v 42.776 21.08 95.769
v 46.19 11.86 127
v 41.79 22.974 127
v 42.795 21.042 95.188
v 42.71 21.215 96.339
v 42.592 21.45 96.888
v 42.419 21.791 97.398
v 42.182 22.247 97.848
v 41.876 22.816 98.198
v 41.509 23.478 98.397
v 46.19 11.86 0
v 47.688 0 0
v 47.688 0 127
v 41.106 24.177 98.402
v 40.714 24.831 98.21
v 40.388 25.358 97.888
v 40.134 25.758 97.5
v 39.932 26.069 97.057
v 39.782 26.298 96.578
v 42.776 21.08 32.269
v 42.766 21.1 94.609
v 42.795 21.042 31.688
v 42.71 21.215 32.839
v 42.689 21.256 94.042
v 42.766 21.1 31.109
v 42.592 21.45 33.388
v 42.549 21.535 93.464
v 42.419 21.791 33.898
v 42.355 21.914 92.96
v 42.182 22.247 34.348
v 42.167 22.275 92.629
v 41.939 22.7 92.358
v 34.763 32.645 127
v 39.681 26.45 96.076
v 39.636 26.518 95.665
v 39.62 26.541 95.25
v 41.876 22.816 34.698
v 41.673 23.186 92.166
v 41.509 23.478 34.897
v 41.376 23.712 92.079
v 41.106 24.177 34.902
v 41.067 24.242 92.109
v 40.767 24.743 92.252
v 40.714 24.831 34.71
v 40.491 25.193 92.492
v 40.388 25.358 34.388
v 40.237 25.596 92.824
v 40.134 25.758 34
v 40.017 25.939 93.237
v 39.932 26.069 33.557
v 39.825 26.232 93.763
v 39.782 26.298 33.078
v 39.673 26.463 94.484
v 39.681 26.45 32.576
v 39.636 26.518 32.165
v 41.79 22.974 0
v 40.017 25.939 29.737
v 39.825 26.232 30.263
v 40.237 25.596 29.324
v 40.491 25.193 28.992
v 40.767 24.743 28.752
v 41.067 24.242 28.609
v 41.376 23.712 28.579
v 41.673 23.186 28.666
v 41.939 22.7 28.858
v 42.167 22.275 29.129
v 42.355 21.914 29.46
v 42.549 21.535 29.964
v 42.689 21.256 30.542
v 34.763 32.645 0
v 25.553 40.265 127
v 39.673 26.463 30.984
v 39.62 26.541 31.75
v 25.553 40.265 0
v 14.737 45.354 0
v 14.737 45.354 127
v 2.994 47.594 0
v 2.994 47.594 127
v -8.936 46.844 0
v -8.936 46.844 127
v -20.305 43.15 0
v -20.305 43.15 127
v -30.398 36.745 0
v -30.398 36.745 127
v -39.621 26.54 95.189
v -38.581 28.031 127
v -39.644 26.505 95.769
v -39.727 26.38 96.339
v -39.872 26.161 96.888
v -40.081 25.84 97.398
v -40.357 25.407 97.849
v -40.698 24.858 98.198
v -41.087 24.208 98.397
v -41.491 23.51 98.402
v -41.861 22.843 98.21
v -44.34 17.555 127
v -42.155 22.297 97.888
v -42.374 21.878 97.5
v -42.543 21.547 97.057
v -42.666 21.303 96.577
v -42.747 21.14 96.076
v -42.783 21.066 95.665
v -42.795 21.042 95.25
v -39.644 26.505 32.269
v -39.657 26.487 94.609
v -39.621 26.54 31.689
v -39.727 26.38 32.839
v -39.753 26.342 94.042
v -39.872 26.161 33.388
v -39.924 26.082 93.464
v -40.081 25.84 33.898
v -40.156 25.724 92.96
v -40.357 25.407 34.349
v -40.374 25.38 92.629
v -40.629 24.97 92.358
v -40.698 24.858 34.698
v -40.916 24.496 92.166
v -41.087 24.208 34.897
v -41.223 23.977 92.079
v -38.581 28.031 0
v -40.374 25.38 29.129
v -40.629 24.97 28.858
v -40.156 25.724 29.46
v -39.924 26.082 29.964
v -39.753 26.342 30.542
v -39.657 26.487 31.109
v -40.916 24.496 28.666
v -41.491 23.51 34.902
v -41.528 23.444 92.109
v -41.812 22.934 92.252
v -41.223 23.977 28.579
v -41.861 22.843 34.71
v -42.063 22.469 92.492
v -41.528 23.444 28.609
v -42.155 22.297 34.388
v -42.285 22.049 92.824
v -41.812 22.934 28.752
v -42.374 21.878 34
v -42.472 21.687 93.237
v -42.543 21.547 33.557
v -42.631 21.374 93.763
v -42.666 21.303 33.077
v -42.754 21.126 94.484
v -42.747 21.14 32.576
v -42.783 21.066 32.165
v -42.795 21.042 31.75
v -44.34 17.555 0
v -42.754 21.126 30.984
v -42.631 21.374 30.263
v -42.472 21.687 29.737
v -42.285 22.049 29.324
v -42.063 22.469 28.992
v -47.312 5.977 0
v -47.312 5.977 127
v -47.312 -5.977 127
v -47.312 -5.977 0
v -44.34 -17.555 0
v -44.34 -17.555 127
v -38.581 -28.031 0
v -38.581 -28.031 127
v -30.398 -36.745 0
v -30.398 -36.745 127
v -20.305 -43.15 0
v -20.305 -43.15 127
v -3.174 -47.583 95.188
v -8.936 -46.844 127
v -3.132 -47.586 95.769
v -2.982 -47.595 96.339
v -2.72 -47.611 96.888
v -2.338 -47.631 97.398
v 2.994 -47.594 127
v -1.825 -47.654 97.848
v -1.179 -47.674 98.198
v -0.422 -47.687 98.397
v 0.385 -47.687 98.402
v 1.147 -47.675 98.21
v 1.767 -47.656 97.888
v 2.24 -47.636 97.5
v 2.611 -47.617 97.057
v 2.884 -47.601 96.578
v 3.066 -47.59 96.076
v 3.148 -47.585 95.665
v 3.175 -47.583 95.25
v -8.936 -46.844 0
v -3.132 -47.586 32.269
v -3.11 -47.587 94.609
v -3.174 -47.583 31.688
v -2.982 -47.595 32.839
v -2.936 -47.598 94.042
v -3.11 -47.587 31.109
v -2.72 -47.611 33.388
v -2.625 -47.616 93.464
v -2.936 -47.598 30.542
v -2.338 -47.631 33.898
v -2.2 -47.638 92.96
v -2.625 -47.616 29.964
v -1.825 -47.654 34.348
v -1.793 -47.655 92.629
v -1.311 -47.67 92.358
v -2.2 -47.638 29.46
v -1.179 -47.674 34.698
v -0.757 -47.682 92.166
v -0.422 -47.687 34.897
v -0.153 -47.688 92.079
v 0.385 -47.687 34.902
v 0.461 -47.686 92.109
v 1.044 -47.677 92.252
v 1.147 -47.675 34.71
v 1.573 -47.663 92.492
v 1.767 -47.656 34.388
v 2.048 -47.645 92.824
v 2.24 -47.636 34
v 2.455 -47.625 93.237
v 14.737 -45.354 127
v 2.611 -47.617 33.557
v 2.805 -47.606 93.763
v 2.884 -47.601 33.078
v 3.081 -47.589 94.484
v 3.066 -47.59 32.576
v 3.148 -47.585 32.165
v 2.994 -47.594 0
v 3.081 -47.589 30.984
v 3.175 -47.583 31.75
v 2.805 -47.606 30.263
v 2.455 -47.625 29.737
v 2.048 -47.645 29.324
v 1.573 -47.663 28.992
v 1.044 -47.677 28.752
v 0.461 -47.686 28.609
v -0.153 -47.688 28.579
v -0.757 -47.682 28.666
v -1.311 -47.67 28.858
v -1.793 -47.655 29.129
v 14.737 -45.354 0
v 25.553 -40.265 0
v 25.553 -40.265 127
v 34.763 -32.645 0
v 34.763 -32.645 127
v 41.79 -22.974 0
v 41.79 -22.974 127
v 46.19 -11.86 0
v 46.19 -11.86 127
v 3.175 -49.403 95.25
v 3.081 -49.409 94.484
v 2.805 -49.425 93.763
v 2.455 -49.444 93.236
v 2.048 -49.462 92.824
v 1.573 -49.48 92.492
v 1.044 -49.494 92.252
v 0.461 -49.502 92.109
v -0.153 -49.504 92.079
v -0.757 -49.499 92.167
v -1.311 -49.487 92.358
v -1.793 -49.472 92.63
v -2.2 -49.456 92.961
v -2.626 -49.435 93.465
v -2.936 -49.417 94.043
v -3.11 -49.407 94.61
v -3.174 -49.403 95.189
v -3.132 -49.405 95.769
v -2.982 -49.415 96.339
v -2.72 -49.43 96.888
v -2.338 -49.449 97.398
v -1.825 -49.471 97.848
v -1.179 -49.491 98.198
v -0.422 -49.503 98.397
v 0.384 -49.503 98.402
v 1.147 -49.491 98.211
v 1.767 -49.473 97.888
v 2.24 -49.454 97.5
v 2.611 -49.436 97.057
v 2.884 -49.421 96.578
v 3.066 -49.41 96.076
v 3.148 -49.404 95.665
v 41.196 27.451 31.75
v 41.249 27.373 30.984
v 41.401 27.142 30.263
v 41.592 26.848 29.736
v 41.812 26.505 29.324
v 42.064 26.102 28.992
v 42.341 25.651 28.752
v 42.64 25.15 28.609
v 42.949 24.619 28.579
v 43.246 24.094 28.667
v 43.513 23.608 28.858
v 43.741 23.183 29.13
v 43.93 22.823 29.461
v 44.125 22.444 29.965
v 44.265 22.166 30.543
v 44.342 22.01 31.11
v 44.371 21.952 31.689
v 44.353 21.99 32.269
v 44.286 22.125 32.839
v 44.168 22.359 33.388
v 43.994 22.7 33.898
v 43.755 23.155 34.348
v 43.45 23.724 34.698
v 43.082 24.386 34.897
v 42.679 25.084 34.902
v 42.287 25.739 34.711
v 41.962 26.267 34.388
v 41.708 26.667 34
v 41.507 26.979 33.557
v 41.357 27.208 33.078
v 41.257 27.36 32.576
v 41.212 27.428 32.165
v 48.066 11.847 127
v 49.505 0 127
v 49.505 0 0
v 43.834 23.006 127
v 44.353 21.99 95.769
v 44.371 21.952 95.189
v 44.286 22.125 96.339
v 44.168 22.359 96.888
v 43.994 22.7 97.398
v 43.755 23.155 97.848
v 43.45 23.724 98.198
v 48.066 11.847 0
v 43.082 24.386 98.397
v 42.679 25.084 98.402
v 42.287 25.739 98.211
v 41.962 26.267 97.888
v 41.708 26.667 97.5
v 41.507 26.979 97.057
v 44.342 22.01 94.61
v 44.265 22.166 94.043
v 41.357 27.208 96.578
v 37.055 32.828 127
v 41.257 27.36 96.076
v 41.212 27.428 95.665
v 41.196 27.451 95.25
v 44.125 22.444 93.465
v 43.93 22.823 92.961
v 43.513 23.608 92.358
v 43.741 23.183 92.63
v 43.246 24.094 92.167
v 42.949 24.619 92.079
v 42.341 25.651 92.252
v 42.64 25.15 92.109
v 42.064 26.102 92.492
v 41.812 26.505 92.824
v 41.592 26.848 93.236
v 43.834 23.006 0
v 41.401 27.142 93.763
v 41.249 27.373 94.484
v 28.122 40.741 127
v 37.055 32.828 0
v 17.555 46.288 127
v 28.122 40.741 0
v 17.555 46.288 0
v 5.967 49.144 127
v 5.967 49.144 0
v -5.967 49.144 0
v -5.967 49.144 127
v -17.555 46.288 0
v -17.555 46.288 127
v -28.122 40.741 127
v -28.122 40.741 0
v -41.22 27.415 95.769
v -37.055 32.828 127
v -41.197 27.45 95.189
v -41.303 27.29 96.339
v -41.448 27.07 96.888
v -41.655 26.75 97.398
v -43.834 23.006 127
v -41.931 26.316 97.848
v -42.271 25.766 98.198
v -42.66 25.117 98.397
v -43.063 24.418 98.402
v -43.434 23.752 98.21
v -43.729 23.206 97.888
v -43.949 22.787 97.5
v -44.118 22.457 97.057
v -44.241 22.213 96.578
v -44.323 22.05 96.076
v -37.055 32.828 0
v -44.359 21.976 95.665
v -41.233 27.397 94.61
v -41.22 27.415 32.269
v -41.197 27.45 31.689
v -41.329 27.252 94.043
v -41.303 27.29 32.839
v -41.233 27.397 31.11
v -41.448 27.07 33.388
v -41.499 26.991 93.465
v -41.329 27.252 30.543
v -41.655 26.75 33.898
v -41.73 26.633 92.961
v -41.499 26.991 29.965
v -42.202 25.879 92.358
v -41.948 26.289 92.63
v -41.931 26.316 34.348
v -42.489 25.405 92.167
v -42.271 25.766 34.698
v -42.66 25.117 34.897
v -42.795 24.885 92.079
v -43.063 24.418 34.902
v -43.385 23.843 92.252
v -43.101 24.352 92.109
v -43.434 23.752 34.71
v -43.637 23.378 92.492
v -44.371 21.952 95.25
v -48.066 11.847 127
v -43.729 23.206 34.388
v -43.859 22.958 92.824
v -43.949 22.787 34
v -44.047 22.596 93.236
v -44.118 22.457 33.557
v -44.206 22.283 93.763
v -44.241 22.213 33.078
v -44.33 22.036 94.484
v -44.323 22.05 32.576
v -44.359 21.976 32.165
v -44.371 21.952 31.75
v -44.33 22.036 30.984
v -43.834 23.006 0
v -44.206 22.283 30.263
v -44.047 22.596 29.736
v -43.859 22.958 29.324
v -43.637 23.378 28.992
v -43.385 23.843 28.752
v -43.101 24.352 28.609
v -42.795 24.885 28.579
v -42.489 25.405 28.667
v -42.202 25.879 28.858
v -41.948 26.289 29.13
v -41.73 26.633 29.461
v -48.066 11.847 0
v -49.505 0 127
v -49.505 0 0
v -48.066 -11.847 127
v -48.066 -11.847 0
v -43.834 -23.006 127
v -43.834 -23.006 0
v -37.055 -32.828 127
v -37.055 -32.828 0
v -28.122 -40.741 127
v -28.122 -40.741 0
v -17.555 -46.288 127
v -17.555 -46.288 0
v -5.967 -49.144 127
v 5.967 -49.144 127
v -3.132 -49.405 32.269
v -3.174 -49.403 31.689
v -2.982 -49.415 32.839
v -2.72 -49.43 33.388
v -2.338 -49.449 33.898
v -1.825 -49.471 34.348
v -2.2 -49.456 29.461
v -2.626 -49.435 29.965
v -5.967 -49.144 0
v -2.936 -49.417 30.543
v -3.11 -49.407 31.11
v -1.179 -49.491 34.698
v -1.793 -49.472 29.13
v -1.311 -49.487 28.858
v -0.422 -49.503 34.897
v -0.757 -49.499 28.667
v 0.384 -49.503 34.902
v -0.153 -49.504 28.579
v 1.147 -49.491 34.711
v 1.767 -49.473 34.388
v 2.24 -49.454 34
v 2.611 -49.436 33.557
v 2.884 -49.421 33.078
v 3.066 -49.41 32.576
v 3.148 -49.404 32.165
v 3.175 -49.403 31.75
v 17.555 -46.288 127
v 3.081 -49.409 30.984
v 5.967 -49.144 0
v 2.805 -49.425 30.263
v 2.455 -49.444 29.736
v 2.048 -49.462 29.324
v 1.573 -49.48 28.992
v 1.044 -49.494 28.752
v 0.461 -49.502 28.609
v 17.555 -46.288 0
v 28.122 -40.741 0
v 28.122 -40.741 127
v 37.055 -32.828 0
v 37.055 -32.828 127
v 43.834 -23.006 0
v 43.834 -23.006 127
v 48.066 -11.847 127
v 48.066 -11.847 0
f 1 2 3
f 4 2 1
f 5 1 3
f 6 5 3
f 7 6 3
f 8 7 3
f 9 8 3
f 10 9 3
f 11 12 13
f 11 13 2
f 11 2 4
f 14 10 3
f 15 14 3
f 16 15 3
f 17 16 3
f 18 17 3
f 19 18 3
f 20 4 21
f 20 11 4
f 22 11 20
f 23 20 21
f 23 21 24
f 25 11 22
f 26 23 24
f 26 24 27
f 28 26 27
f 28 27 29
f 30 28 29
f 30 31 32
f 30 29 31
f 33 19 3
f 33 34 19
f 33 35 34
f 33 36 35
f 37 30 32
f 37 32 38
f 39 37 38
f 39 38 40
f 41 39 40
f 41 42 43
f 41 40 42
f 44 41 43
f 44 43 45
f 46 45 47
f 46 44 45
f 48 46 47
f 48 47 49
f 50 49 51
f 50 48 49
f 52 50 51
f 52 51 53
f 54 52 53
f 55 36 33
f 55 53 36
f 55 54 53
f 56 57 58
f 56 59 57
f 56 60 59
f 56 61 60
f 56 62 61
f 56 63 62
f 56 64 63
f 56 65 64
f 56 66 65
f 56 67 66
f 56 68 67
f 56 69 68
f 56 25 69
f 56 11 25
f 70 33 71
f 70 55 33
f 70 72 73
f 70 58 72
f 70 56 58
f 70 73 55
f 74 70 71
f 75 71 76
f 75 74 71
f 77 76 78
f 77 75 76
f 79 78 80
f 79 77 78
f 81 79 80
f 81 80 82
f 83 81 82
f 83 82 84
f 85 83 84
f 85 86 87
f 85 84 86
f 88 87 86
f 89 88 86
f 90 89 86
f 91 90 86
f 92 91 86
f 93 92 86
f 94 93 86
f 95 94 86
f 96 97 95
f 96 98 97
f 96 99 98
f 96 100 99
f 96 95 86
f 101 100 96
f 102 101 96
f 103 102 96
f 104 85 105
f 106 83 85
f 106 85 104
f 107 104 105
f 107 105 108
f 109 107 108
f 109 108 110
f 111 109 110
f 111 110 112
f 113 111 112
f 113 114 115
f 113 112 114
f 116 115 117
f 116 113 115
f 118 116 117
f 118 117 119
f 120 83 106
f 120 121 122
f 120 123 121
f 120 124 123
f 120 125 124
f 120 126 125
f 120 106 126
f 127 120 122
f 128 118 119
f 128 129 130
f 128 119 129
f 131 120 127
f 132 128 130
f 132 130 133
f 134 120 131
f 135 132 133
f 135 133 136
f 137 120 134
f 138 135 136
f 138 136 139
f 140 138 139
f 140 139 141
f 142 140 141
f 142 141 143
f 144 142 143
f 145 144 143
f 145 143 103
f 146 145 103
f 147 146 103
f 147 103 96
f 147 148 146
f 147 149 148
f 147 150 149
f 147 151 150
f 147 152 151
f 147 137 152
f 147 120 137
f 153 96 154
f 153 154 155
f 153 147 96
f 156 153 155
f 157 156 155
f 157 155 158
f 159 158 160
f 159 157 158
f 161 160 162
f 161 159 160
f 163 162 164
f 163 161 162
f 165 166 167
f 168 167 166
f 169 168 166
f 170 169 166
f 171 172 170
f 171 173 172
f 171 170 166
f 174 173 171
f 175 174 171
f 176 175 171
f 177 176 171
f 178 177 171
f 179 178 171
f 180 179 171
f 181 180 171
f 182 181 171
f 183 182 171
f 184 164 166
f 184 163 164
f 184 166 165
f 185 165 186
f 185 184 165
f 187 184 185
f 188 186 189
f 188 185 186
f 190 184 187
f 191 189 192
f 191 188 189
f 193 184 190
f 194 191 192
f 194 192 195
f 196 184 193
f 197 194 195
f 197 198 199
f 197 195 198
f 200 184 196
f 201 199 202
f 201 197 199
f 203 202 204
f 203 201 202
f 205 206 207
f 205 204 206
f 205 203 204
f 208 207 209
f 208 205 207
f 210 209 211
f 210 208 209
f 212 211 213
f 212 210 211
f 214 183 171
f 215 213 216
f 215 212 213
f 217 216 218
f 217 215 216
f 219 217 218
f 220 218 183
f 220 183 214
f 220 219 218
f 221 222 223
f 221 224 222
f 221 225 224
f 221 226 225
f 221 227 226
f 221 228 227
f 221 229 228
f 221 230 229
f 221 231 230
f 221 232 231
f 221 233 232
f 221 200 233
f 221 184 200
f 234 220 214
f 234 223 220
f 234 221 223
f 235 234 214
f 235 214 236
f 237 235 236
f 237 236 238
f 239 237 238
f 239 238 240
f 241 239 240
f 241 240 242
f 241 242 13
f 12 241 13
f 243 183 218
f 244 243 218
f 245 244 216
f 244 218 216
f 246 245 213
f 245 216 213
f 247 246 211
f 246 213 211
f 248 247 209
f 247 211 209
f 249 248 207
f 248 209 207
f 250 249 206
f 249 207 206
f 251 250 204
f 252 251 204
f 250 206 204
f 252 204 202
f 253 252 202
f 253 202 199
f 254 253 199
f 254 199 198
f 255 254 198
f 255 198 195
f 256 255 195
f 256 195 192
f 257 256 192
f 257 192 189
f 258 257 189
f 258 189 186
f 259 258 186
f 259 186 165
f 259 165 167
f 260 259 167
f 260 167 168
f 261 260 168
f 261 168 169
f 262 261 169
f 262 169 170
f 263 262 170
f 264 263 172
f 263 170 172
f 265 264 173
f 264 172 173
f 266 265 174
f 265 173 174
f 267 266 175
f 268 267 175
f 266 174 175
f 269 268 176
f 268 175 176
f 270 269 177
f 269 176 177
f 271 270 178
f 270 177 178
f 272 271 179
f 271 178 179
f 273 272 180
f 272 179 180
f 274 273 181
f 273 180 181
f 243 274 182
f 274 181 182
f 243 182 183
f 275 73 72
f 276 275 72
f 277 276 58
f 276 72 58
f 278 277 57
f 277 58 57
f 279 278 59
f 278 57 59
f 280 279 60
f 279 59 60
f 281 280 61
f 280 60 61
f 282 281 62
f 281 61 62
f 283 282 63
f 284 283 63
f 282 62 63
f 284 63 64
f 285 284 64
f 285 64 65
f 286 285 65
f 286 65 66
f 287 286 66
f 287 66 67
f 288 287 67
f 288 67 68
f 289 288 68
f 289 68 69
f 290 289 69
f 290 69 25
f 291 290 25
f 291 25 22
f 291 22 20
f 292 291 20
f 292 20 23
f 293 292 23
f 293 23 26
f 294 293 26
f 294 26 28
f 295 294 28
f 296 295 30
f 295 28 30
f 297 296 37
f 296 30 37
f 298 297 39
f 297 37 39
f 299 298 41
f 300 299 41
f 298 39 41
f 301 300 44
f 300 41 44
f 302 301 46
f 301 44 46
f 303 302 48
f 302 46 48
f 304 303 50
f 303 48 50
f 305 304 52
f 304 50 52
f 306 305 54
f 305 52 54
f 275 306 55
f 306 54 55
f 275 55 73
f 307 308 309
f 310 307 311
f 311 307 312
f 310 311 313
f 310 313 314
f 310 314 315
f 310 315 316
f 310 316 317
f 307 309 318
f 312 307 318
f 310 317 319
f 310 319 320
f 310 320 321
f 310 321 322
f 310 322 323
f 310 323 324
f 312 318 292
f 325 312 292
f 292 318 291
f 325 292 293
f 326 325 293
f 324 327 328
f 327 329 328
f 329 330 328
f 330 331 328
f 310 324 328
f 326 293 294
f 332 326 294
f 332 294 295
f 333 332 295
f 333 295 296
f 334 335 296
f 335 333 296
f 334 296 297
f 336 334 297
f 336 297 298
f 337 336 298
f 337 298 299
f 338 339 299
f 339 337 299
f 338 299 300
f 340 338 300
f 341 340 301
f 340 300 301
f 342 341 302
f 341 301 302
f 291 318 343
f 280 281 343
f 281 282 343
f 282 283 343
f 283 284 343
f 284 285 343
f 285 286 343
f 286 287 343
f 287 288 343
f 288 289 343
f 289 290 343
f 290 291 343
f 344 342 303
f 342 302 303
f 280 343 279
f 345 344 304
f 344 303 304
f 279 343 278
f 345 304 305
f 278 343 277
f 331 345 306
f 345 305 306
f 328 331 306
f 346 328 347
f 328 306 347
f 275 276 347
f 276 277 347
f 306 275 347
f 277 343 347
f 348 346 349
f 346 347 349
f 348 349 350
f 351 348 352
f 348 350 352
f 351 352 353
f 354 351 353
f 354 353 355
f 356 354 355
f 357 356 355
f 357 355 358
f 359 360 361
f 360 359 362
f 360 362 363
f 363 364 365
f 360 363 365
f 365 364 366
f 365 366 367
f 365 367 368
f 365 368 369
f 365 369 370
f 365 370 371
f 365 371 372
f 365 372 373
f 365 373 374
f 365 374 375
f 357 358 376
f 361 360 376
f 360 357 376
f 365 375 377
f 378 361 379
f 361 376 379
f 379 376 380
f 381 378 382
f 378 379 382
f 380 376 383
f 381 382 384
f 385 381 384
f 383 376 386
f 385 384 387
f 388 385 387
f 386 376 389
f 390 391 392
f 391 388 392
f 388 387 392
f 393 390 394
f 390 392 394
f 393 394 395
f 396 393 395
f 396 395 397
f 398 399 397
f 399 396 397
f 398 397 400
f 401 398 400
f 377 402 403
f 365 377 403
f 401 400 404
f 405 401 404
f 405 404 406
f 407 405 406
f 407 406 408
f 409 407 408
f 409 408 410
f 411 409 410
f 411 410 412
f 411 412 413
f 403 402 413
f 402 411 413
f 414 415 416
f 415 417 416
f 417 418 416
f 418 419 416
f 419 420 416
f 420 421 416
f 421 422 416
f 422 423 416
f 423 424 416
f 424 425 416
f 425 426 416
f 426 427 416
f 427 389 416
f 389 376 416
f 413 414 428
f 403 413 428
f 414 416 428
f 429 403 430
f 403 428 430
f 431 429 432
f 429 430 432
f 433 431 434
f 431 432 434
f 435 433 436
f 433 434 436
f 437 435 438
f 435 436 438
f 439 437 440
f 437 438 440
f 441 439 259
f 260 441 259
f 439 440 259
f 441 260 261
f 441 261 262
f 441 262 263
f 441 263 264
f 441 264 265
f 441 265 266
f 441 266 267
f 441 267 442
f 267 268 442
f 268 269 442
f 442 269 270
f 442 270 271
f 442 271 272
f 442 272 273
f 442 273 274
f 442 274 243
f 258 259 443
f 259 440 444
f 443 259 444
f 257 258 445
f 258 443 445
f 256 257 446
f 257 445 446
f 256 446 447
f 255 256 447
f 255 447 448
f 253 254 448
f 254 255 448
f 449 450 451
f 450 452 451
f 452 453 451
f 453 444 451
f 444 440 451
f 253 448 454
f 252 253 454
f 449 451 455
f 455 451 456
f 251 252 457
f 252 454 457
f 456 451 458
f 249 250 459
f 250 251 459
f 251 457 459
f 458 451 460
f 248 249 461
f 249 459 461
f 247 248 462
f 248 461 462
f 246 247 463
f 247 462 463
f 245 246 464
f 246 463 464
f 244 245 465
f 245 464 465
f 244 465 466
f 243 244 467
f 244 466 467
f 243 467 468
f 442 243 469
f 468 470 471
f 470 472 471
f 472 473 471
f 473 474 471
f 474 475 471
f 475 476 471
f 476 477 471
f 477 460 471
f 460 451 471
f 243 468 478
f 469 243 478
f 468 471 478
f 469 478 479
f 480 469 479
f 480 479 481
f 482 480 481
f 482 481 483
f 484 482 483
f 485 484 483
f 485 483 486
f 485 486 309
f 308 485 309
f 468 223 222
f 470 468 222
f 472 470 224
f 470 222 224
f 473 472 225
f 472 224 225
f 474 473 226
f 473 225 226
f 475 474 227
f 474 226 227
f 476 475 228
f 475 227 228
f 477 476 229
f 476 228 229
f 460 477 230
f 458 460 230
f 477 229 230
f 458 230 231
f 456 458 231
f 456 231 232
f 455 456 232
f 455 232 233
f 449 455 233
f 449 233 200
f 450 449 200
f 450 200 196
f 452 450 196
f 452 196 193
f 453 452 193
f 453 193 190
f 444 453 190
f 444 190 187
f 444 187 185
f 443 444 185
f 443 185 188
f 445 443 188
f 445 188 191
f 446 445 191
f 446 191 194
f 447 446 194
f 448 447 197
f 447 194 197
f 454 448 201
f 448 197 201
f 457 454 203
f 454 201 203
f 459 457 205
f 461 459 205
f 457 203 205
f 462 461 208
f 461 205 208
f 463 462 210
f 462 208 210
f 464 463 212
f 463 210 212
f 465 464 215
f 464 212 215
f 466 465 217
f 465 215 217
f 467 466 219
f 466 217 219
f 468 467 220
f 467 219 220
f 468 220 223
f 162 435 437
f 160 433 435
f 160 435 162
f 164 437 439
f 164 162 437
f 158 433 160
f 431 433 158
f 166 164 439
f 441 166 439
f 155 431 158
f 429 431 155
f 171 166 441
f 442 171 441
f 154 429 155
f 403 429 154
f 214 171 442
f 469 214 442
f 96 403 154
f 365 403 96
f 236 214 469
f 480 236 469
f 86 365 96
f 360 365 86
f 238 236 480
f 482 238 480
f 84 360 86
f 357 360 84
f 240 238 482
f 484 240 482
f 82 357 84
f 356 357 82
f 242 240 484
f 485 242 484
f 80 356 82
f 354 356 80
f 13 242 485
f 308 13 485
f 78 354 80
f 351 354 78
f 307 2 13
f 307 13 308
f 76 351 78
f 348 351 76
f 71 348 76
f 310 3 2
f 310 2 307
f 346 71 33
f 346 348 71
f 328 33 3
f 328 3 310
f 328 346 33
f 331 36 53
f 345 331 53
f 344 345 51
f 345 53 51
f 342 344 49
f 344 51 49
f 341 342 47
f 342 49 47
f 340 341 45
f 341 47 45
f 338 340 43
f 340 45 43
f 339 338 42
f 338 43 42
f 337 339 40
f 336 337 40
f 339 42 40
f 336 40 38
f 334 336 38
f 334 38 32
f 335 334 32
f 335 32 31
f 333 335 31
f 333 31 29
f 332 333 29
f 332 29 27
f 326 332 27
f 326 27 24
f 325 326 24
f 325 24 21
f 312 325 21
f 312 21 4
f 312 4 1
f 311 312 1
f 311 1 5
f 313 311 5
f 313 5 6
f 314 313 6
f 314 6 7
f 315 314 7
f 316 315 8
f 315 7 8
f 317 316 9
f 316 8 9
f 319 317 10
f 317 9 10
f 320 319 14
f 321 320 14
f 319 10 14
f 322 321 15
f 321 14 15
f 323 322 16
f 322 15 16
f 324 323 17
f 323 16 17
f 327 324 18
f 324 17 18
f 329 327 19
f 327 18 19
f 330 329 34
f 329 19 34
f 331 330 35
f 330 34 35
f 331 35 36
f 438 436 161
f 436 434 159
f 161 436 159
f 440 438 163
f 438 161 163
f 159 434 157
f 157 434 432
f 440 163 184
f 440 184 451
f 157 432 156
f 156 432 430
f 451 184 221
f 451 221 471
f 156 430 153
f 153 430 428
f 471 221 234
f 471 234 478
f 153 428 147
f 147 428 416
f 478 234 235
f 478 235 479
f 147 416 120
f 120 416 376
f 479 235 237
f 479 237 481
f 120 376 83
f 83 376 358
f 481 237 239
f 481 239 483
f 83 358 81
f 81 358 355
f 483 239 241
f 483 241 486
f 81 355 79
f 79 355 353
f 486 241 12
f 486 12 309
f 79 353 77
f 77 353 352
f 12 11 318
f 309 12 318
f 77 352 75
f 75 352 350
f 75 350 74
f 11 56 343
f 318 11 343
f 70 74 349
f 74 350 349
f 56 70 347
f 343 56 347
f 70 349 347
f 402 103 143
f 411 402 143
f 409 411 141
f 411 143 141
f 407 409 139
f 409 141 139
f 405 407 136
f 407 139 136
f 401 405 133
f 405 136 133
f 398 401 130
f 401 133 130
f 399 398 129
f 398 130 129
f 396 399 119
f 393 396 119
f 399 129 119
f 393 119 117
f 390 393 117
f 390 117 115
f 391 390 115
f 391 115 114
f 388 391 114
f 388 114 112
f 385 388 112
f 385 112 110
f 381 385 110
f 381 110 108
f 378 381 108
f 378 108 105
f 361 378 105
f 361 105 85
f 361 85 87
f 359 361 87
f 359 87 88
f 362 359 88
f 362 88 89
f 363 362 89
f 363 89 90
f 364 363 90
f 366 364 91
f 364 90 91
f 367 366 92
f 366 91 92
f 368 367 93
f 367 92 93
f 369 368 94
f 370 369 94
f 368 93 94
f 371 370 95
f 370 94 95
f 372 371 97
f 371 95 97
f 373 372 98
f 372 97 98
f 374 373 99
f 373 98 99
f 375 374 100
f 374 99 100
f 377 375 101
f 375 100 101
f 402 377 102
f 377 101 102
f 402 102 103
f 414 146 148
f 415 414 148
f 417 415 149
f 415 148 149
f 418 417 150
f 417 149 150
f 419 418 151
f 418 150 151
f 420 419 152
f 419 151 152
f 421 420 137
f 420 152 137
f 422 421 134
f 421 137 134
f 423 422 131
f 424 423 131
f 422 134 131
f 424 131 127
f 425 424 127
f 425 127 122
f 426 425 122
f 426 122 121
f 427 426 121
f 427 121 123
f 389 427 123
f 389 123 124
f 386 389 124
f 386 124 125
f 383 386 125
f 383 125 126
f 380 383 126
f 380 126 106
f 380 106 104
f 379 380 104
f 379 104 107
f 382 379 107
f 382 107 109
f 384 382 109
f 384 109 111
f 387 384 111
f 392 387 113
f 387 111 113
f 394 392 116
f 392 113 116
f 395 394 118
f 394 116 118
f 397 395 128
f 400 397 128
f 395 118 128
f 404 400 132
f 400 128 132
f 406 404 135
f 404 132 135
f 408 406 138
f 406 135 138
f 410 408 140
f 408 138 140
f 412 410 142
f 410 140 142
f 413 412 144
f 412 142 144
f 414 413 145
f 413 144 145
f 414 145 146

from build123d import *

# Parameters (mm, degrees)
SKETCH1_R           = 49.5046
SKETCH1_R_2         = 47.6885
BOSS_EXTRUDE1_DEPTH = 127
SKETCH4_R           = 3.175
CUT_EXTRUDE3_DEPTH  = 50.5046
CIRPATTERN2_COUNT   = 3


with BuildPart() as part:
    # Sketch1 → Boss-Extrude1 (new body)
    with BuildSketch(Plane.XY):
        Circle(SKETCH1_R)
        Circle(SKETCH1_R_2, mode=Mode.SUBTRACT)
    extrude(amount=BOSS_EXTRUDE1_DEPTH)

    # Sketch4 → Cut-Extrude3 (cut, through all)
    with BuildSketch(Plane(origin=(0, 0, 0), x_dir=(1, 0, 0), z_dir=(0, 1, 0))):
        with Locations((0, -31.75)):
            Circle(SKETCH4_R)
        with Locations((0, -95.25)):
            Circle(SKETCH4_R)
    cut_extrude3 = extrude(amount=-CUT_EXTRUDE3_DEPTH, mode=Mode.SUBTRACT)

    # CirPattern2: Cut-Extrude3 ×3 about axis
    cirpattern2_axis = Axis((0, 0, 127), (0, 0, -1))
    for i in range(1, CIRPATTERN2_COUNT):
        add(cut_extrude3.rotate(cirpattern2_axis, i * 360 / CIRPATTERN2_COUNT), mode=Mode.SUBTRACT)


solid = part.part
